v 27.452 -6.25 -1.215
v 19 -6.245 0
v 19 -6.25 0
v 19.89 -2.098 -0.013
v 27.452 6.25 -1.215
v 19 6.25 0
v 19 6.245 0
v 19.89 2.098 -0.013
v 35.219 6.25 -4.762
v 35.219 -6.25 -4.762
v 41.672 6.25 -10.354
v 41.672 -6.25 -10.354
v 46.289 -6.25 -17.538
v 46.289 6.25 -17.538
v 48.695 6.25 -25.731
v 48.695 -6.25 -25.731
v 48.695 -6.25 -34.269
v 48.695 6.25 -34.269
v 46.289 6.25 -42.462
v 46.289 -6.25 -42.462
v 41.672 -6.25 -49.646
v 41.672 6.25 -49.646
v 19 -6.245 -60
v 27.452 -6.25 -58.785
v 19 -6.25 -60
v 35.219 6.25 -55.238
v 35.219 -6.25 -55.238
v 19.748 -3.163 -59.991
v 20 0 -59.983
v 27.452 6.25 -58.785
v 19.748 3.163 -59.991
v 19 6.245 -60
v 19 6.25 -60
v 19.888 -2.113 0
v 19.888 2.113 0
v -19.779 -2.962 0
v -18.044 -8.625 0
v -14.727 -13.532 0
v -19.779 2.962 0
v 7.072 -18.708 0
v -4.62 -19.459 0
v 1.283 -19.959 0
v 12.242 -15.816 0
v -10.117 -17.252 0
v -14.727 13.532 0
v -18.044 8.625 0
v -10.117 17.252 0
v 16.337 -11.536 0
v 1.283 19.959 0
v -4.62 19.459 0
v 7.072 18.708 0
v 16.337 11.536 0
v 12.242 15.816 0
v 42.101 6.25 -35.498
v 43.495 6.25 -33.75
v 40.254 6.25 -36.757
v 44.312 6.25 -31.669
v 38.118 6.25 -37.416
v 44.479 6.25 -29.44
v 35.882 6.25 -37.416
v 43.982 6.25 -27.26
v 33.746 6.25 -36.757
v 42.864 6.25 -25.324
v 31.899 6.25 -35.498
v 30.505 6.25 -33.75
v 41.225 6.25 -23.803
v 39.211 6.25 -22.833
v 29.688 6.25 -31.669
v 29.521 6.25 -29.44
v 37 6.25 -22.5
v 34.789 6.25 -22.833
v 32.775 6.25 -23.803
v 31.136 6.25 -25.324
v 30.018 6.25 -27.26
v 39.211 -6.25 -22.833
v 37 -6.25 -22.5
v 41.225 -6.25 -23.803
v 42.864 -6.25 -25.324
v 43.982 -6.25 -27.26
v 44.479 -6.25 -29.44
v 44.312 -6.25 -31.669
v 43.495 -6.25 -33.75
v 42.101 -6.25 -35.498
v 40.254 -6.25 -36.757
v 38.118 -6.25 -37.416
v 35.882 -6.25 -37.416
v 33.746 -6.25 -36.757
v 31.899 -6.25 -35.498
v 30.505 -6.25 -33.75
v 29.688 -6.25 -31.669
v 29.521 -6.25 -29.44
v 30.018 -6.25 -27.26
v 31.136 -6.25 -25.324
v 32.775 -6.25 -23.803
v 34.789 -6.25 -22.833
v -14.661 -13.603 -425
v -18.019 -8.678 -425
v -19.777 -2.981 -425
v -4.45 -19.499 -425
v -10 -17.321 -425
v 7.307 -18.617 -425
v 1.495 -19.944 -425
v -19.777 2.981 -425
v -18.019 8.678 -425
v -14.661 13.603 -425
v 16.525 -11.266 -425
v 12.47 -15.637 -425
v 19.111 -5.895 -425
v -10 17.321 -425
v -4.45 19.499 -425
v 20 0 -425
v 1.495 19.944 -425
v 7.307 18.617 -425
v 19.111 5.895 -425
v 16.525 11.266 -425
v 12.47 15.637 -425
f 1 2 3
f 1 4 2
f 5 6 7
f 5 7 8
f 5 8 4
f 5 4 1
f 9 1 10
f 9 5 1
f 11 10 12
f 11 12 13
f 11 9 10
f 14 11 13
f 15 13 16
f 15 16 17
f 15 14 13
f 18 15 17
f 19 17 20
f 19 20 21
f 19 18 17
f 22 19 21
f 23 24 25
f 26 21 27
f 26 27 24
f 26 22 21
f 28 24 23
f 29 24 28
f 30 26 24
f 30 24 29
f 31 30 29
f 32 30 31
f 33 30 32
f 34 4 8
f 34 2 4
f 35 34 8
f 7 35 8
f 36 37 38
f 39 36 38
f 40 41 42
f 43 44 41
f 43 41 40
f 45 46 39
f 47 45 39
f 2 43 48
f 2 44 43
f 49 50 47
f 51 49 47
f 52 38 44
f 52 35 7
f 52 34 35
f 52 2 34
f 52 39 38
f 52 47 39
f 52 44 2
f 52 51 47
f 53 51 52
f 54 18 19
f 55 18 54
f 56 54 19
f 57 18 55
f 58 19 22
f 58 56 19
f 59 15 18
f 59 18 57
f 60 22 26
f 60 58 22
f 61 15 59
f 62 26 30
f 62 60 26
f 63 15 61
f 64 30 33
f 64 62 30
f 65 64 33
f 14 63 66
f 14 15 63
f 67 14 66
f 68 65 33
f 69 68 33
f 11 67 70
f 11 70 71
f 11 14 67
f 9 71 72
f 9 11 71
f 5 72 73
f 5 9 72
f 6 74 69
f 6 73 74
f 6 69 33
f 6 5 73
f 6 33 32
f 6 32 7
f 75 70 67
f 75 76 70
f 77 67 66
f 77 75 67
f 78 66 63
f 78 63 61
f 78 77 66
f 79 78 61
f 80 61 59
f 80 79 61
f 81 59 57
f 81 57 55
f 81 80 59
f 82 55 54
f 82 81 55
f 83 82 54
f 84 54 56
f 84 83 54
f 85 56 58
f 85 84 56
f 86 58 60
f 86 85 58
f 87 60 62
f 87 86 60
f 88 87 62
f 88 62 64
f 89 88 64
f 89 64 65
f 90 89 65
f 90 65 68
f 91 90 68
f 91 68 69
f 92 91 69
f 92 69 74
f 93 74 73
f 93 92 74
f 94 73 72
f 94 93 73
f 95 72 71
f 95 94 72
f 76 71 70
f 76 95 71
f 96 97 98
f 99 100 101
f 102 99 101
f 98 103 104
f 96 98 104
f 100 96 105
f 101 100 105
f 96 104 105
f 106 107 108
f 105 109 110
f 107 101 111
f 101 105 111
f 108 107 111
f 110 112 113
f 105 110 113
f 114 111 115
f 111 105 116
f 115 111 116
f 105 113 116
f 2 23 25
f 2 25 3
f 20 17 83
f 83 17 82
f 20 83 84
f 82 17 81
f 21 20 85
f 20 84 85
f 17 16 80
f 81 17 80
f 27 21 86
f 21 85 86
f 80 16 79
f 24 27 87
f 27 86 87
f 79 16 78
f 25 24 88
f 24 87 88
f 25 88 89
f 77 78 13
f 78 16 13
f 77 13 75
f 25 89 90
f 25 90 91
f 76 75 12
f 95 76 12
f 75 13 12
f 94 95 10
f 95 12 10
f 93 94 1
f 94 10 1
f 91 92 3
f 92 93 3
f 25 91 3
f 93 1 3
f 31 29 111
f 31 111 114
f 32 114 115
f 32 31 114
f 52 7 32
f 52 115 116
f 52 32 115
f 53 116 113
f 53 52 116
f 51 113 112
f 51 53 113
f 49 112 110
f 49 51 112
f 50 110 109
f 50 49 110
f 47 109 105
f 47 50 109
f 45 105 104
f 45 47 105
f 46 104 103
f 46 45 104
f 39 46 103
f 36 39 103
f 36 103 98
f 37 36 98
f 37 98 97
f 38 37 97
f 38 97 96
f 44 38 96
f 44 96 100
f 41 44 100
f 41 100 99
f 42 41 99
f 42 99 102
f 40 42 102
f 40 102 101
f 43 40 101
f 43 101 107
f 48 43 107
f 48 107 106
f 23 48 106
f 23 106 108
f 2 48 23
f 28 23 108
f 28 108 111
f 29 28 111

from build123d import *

# Parameters (mm, degrees)
SKETCH1_R           = 20
BASE_EXTRUDE_DEPTH  = 425
SKETCH4_R           = 7.5
BOSS_EXTRUDE1_DEPTH = 6.25


with BuildPart() as part:
    # Sketch1 → Base-Extrude (new body)
    with BuildSketch(Plane.XY):
        Circle(SKETCH1_R)
    extrude(amount=-BASE_EXTRUDE_DEPTH)

    # Sketch4 → Boss-Extrude1 (add, symmetric)
    with BuildSketch(Plane(origin=(0, 0, 0), x_dir=(-1, 0, 0), z_dir=(0, 1, 0))):
        with BuildLine():
            Line((-19, -60), (-19, 0))
            ThreePointArc((-19, 0), (-49, -30), (-19, -60))
        make_face()
        with Locations(Location((-37, -30, 0), (0, 0, 90))):
            Circle(SKETCH4_R, mode=Mode.SUBTRACT)
    extrude(amount=BOSS_EXTRUDE1_DEPTH, both=True)


solid = part.part
